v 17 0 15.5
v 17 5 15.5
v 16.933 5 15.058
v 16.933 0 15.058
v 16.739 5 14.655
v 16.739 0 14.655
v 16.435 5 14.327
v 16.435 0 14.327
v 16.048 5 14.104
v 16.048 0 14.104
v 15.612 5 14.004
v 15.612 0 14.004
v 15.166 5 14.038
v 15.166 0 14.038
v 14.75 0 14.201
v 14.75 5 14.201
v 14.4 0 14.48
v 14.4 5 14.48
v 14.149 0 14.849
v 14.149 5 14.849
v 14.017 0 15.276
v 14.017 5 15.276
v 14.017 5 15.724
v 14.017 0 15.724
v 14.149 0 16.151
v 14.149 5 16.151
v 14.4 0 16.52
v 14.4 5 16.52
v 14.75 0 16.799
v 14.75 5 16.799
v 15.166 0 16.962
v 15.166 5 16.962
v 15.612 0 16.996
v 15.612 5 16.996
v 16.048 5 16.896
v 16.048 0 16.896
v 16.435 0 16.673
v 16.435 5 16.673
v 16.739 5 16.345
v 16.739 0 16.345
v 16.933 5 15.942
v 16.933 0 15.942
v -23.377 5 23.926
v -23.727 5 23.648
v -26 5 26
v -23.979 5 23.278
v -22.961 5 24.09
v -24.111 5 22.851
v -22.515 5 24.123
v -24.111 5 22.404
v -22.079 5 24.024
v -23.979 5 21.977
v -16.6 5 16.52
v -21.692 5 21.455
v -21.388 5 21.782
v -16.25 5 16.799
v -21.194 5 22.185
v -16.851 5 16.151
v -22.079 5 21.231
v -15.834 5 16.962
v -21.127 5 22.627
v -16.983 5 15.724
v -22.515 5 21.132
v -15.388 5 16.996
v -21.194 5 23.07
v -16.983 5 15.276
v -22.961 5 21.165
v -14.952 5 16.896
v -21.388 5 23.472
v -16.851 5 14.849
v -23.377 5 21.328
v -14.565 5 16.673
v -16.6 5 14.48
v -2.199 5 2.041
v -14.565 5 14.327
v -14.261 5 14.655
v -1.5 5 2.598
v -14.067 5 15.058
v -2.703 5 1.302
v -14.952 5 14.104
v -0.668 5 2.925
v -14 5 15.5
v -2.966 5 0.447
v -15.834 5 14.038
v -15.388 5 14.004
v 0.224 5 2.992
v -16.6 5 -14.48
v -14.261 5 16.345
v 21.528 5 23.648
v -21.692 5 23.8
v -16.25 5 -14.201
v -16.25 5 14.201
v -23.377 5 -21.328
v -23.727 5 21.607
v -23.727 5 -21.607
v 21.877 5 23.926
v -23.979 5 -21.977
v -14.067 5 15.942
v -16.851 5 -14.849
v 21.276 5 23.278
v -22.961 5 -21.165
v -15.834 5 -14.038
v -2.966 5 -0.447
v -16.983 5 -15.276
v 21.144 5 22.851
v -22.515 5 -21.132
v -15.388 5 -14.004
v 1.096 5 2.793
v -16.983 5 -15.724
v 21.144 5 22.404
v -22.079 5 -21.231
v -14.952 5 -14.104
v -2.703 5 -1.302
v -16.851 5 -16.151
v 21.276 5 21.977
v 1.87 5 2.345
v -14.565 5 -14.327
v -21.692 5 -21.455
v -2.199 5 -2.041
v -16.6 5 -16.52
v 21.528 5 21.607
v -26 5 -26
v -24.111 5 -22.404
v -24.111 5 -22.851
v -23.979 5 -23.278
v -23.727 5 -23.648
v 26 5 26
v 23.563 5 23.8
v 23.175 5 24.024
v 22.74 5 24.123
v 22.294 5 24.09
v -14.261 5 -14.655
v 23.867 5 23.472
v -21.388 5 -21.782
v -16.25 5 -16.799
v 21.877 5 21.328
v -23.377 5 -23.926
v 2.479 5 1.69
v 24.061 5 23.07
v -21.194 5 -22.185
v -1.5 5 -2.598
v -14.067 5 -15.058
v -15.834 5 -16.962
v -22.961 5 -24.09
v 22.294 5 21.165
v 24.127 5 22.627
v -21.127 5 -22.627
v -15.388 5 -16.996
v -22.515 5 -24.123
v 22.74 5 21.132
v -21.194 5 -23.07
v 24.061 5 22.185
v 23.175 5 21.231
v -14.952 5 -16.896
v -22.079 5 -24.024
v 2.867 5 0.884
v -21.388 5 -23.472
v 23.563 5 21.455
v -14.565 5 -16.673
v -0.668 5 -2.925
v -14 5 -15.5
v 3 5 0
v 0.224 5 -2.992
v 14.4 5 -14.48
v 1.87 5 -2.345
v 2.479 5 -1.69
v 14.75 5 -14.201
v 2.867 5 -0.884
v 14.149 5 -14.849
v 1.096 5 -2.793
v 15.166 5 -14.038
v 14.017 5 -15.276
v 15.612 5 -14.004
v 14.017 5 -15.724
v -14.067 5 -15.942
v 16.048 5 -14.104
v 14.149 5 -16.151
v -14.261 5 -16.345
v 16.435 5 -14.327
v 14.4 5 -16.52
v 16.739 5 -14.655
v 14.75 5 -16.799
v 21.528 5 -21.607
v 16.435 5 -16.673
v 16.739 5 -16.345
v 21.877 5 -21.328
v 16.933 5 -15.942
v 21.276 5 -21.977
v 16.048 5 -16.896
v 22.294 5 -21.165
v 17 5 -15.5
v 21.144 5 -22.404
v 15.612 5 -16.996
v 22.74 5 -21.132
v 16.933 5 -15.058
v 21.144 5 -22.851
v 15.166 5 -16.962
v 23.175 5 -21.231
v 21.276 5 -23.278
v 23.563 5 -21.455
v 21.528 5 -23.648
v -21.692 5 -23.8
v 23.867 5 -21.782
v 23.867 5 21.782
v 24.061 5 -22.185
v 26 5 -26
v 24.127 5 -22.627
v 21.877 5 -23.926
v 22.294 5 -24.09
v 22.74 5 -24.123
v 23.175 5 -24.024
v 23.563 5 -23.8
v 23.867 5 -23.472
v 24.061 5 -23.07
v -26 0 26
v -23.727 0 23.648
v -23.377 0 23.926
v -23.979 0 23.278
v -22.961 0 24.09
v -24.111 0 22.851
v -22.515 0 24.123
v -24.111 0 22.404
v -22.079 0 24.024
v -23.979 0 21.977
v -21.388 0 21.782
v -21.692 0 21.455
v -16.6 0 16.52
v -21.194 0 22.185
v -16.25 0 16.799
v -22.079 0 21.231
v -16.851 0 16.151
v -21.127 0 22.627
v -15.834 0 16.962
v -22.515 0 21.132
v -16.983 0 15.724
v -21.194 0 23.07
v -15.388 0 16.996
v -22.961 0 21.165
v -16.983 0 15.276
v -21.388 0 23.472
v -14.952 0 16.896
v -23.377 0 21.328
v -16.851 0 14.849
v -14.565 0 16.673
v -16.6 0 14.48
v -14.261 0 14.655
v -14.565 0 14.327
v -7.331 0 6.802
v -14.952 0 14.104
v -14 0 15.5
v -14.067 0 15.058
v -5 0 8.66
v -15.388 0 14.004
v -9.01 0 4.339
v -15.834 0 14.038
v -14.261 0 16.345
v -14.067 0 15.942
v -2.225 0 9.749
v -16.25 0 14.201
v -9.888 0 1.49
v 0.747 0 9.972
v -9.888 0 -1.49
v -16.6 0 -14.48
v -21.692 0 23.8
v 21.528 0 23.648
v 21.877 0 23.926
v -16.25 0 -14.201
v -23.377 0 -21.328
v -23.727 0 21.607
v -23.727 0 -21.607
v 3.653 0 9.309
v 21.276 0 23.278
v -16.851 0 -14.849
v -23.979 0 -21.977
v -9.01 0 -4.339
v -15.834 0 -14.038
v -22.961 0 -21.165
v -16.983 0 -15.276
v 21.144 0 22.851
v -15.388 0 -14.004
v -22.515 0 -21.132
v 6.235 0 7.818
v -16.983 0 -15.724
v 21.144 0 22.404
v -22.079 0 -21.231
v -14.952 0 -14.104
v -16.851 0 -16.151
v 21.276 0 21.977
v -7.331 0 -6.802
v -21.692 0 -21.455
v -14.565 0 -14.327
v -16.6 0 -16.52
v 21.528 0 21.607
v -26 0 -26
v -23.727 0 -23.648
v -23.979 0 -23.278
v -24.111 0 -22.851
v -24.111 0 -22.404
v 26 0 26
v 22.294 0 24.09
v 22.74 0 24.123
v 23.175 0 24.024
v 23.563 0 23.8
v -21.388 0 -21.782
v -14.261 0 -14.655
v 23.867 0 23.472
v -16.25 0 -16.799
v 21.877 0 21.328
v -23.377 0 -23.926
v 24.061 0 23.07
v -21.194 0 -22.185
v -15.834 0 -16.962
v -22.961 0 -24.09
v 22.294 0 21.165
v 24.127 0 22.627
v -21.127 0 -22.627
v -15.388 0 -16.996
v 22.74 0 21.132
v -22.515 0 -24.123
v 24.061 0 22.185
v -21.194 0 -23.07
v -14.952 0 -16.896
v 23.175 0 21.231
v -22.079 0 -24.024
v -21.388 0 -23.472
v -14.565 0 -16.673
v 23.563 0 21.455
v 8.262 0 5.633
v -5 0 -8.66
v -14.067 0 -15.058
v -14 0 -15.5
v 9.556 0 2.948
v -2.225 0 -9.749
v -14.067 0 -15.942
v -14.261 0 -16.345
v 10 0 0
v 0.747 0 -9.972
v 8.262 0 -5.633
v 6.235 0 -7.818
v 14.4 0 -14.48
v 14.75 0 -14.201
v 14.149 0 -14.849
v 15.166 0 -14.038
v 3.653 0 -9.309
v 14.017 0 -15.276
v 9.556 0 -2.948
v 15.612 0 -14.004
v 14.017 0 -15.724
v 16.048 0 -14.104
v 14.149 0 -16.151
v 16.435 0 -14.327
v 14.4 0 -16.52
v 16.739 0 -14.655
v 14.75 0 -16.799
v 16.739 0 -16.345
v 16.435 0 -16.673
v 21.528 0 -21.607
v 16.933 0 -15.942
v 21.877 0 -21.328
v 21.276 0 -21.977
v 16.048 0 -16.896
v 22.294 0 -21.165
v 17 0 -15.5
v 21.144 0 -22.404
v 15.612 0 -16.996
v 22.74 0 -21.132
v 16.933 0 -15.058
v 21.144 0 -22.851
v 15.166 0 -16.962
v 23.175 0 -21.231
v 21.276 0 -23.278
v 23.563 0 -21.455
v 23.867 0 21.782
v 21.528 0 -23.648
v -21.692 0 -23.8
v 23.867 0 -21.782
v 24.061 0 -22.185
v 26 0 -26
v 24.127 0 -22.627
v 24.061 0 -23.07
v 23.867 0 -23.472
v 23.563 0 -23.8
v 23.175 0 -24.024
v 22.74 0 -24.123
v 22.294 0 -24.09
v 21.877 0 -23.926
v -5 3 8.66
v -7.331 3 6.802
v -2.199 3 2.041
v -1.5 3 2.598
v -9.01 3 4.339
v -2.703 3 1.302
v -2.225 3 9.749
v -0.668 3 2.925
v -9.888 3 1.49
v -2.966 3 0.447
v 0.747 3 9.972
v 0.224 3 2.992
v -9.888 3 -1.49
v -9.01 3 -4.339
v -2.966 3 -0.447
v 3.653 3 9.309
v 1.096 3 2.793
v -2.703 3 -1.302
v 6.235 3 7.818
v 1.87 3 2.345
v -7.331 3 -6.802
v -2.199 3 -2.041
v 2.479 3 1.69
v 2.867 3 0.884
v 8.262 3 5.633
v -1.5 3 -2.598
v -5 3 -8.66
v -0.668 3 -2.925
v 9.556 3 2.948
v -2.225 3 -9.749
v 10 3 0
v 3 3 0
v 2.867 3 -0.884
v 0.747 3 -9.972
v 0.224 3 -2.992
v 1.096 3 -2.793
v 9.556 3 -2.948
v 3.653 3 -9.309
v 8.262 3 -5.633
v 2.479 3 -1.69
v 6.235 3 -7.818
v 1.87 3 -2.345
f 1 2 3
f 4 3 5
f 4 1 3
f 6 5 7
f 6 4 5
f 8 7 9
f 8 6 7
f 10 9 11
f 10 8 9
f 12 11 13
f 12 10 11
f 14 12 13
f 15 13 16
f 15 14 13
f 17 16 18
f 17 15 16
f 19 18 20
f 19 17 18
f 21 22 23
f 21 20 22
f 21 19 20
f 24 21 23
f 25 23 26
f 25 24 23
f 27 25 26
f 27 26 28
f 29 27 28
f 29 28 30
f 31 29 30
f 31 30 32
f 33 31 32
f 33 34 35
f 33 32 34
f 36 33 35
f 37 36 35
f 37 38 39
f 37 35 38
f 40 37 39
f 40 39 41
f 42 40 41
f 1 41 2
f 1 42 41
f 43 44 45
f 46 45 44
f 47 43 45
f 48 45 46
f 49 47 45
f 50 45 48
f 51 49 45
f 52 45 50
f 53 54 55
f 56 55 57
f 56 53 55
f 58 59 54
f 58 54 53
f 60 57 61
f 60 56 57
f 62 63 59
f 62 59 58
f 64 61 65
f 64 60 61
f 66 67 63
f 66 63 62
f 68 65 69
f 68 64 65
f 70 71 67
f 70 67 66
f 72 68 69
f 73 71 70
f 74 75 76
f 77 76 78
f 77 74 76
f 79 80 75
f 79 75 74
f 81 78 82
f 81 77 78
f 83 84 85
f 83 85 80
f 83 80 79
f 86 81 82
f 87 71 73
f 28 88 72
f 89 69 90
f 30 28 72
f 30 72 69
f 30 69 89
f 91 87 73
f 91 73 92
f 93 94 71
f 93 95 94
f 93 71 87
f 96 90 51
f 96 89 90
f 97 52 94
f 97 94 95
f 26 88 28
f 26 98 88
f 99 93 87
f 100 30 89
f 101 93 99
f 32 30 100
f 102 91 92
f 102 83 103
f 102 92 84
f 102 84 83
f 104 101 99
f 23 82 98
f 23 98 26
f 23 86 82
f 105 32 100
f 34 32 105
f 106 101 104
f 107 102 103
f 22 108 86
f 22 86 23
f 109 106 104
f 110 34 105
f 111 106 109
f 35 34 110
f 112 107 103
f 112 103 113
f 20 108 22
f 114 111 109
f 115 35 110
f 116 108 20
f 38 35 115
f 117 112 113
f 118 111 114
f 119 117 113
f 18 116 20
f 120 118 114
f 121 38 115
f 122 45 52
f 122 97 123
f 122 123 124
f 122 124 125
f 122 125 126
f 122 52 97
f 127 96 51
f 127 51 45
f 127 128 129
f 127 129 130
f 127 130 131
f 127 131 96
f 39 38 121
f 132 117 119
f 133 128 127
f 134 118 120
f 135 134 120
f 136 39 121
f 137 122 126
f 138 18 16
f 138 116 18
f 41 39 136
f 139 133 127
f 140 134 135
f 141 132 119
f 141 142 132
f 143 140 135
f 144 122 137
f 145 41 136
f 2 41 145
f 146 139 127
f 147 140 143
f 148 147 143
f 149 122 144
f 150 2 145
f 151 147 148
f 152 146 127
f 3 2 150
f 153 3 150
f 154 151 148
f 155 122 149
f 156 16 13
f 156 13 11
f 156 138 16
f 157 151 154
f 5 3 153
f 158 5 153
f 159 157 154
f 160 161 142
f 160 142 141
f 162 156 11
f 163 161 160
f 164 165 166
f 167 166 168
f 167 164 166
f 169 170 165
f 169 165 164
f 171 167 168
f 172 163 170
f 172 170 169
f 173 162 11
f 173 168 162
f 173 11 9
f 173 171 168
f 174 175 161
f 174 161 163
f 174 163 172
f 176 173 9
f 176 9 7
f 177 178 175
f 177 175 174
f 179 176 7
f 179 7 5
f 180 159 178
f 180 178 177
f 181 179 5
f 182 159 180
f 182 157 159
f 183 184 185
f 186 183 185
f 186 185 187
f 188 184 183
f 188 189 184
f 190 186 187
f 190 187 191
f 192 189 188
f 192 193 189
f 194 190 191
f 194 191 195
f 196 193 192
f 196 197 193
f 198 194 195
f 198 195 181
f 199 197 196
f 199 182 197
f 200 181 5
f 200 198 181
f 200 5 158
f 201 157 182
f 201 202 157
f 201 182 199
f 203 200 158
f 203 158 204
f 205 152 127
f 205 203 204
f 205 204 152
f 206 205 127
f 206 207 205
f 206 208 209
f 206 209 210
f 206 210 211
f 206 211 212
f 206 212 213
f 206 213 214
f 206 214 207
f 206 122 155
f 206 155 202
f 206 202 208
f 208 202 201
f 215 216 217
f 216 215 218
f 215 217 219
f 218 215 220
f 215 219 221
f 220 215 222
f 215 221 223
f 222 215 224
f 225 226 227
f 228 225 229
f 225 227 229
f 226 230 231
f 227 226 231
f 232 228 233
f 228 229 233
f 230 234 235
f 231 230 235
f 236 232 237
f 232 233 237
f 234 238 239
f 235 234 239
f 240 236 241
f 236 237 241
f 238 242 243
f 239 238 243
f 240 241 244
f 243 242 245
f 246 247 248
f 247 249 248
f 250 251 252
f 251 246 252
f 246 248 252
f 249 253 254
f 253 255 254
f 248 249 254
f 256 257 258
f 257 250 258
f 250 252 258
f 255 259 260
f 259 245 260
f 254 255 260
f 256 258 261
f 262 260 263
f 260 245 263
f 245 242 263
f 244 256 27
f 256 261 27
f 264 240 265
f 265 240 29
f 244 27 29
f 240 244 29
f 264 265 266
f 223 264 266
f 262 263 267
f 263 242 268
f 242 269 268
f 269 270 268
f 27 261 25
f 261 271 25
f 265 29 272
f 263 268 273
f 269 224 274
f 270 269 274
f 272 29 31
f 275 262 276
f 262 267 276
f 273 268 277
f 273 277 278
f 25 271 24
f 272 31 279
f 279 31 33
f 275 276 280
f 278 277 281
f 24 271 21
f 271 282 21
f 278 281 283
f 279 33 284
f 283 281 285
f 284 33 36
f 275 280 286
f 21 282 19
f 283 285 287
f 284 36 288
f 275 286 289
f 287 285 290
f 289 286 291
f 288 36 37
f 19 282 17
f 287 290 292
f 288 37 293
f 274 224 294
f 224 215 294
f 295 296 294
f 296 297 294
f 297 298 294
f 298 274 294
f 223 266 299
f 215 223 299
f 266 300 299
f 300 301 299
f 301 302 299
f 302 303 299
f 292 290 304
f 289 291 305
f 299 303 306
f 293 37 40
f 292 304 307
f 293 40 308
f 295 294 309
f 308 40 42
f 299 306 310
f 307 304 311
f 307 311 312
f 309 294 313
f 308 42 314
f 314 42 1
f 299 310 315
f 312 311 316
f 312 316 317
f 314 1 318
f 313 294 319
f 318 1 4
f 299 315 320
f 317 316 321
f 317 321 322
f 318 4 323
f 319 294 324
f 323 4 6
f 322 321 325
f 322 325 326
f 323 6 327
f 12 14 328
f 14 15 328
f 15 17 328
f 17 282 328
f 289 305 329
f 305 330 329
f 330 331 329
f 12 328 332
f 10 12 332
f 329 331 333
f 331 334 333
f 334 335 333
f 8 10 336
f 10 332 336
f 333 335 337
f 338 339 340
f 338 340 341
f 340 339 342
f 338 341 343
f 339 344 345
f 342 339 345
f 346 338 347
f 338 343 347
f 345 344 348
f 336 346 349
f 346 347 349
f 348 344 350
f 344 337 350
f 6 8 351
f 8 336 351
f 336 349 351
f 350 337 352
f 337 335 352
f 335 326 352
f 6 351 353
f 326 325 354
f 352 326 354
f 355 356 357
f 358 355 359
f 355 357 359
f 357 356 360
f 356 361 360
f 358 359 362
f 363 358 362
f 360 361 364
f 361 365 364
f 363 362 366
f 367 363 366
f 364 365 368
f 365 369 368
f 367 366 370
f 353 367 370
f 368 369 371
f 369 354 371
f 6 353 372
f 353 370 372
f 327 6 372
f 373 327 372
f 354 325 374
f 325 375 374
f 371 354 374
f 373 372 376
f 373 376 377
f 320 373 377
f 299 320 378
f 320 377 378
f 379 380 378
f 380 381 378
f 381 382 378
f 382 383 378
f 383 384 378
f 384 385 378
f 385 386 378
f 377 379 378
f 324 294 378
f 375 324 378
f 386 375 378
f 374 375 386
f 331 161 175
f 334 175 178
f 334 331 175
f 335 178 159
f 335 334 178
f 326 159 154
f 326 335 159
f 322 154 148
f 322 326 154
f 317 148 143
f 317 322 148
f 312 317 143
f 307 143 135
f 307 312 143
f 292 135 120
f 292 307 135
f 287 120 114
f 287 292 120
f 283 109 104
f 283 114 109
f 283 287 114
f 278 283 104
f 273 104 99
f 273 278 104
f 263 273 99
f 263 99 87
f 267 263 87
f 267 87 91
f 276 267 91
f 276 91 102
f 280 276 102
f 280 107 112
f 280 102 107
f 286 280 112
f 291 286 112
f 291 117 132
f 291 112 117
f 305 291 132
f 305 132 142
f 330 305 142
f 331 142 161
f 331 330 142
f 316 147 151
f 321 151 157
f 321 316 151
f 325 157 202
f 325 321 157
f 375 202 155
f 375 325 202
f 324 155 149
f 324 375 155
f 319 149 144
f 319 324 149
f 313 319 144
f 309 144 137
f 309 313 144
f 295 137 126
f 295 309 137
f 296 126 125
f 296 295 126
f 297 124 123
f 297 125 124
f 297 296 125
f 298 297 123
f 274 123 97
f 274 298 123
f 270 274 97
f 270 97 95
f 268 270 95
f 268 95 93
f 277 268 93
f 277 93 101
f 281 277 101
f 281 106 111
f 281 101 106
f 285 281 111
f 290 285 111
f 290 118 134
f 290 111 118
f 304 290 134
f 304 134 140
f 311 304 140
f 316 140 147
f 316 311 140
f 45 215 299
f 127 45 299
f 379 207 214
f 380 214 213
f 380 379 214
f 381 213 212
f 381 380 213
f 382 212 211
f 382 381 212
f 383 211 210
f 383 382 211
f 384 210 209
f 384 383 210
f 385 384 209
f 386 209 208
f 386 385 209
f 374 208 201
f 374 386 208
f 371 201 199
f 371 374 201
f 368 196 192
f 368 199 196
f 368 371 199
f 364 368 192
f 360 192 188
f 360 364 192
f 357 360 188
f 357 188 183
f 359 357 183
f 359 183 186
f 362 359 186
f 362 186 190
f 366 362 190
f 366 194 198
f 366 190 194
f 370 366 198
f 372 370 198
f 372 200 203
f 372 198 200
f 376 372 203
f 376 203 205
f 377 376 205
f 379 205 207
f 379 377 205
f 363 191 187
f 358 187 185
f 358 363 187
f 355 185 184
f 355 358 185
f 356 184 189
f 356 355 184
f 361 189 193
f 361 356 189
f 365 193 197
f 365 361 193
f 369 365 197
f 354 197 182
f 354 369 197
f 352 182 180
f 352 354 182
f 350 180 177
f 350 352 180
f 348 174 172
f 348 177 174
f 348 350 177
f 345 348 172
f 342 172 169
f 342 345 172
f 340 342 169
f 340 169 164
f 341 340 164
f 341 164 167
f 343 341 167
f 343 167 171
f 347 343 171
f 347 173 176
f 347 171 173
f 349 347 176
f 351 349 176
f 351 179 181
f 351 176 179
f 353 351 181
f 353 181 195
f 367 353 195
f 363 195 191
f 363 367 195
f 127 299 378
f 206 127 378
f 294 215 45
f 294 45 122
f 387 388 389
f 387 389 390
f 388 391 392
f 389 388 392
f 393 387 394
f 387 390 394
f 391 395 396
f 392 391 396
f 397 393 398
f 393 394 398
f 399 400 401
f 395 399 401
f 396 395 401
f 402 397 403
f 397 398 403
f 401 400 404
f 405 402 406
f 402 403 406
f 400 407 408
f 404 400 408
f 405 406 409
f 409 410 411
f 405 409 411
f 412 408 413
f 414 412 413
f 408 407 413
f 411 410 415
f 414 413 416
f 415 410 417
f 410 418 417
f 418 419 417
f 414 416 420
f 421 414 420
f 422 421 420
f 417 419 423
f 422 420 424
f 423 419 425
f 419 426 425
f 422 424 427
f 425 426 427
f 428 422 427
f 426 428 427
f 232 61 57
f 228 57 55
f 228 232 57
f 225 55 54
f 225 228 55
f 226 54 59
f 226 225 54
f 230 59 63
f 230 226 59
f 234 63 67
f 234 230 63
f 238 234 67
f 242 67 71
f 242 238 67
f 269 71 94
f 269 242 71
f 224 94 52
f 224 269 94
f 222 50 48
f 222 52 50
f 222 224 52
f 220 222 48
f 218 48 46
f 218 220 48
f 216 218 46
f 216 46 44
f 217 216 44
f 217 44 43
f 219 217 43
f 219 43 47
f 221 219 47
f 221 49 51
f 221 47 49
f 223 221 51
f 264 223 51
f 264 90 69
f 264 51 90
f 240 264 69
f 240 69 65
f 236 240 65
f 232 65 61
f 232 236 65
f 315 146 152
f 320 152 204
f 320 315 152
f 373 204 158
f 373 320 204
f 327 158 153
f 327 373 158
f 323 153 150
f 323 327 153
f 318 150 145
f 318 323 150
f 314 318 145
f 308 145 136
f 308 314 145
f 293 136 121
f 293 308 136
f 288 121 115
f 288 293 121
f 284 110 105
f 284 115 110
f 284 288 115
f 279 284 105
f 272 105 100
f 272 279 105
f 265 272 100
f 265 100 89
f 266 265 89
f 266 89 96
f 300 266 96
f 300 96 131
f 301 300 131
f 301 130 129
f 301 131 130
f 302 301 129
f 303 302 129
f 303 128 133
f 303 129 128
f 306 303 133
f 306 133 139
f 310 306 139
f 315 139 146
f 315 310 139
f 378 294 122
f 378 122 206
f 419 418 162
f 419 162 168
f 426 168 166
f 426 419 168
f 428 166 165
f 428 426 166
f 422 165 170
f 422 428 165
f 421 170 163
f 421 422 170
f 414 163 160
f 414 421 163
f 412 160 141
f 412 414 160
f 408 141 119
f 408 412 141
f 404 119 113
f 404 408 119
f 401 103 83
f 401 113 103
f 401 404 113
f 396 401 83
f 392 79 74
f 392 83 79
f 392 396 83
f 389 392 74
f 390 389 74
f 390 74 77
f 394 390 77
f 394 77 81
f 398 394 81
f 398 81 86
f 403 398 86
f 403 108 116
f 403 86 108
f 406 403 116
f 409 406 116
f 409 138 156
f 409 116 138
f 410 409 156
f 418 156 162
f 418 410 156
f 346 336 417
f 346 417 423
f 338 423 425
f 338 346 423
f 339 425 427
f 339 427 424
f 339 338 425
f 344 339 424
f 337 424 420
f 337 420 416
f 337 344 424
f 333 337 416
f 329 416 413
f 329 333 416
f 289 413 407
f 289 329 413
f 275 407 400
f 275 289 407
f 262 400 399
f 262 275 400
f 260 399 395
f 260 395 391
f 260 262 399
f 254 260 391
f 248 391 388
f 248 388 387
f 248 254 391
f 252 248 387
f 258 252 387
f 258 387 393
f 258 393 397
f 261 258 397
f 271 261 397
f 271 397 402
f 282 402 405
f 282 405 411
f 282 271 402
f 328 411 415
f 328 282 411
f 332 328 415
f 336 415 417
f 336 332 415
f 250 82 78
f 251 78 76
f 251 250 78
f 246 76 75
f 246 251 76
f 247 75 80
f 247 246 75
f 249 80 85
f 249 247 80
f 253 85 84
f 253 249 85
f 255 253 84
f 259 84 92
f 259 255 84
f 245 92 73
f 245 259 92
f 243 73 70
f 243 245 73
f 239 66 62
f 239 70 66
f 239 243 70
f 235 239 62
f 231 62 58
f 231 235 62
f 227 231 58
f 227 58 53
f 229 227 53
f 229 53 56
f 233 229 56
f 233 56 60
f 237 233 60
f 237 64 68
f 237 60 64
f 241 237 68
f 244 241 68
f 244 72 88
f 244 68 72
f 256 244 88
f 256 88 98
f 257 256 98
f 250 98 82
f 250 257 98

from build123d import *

# Parameters (mm, degrees)
SKETCH1_W           = 52
SKETCH1_H           = 52
BOSS_EXTRUDE1_DEPTH = 5
SKETCH1_5_R         = 1.5
CUT_EXTRUDE2_DEPTH  = 13
SKETCH1_8_R         = 10
CUT_EXTRUDE5_DEPTH  = 3
SKETCH1_9_R         = 3
CUT_EXTRUDE6_DEPTH  = 24
SKETCH1_10_R        = 1.5
CUT_EXTRUDE7_DEPTH  = 24


with BuildPart() as part:
    # Sketch1 → Boss-Extrude1 (new body)
    with BuildSketch(Plane(origin=(0, 0, 0), x_dir=(1, 0, 0), z_dir=(0, 1, 0))):
        Rectangle(SKETCH1_W, SKETCH1_H)
    extrude(amount=BOSS_EXTRUDE1_DEPTH)

    # Sketch1<5> → Cut-Extrude2 (cut)
    with BuildSketch(Plane(origin=(0, 0, 0), x_dir=(1, 0, 0), z_dir=(0, 1, 0))):
        with Locations((22.627416998, 22.627416998)):
            Circle(SKETCH1_5_R)
        with Locations((22.627416998, -22.627416998)):
            Circle(SKETCH1_5_R)
        with Locations((-22.627416998, 22.627416998)):
            Circle(SKETCH1_5_R)
        with Locations((-22.627416998, -22.627416998)):
            Circle(SKETCH1_5_R)
        with Locations((15.5, -15.5)):
            Circle(SKETCH1_5_R)
        with Locations((-15.5, 15.5)):
            Circle(SKETCH1_5_R)
    extrude(amount=CUT_EXTRUDE2_DEPTH, mode=Mode.SUBTRACT)

    # Sketch1<8> → Cut-Extrude5 (cut)
    with BuildSketch(Plane(origin=(0, 0, 0), x_dir=(1, 0, 0), z_dir=(0, 1, 0))):
        Circle(SKETCH1_8_R)
    extrude(amount=CUT_EXTRUDE5_DEPTH, mode=Mode.SUBTRACT)

    # Sketch1<9> → Cut-Extrude6 (cut)
    with BuildSketch(Plane(origin=(0, 0, 0), x_dir=(1, 0, 0), z_dir=(0, 1, 0))):
        Circle(SKETCH1_9_R)
    extrude(amount=CUT_EXTRUDE6_DEPTH, mode=Mode.SUBTRACT)

    # Sketch1<10> → Cut-Extrude7 (cut)
    with BuildSketch(Plane(origin=(0, 0, 0), x_dir=(1, 0, 0), z_dir=(0, 1, 0))):
        with Locations((15.5, 15.5)):
            Circle(SKETCH1_10_R)
        with Locations((-15.5, -15.5)):
            Circle(SKETCH1_10_R)
    extrude(amount=CUT_EXTRUDE7_DEPTH, mode=Mode.SUBTRACT)


solid = part.part
